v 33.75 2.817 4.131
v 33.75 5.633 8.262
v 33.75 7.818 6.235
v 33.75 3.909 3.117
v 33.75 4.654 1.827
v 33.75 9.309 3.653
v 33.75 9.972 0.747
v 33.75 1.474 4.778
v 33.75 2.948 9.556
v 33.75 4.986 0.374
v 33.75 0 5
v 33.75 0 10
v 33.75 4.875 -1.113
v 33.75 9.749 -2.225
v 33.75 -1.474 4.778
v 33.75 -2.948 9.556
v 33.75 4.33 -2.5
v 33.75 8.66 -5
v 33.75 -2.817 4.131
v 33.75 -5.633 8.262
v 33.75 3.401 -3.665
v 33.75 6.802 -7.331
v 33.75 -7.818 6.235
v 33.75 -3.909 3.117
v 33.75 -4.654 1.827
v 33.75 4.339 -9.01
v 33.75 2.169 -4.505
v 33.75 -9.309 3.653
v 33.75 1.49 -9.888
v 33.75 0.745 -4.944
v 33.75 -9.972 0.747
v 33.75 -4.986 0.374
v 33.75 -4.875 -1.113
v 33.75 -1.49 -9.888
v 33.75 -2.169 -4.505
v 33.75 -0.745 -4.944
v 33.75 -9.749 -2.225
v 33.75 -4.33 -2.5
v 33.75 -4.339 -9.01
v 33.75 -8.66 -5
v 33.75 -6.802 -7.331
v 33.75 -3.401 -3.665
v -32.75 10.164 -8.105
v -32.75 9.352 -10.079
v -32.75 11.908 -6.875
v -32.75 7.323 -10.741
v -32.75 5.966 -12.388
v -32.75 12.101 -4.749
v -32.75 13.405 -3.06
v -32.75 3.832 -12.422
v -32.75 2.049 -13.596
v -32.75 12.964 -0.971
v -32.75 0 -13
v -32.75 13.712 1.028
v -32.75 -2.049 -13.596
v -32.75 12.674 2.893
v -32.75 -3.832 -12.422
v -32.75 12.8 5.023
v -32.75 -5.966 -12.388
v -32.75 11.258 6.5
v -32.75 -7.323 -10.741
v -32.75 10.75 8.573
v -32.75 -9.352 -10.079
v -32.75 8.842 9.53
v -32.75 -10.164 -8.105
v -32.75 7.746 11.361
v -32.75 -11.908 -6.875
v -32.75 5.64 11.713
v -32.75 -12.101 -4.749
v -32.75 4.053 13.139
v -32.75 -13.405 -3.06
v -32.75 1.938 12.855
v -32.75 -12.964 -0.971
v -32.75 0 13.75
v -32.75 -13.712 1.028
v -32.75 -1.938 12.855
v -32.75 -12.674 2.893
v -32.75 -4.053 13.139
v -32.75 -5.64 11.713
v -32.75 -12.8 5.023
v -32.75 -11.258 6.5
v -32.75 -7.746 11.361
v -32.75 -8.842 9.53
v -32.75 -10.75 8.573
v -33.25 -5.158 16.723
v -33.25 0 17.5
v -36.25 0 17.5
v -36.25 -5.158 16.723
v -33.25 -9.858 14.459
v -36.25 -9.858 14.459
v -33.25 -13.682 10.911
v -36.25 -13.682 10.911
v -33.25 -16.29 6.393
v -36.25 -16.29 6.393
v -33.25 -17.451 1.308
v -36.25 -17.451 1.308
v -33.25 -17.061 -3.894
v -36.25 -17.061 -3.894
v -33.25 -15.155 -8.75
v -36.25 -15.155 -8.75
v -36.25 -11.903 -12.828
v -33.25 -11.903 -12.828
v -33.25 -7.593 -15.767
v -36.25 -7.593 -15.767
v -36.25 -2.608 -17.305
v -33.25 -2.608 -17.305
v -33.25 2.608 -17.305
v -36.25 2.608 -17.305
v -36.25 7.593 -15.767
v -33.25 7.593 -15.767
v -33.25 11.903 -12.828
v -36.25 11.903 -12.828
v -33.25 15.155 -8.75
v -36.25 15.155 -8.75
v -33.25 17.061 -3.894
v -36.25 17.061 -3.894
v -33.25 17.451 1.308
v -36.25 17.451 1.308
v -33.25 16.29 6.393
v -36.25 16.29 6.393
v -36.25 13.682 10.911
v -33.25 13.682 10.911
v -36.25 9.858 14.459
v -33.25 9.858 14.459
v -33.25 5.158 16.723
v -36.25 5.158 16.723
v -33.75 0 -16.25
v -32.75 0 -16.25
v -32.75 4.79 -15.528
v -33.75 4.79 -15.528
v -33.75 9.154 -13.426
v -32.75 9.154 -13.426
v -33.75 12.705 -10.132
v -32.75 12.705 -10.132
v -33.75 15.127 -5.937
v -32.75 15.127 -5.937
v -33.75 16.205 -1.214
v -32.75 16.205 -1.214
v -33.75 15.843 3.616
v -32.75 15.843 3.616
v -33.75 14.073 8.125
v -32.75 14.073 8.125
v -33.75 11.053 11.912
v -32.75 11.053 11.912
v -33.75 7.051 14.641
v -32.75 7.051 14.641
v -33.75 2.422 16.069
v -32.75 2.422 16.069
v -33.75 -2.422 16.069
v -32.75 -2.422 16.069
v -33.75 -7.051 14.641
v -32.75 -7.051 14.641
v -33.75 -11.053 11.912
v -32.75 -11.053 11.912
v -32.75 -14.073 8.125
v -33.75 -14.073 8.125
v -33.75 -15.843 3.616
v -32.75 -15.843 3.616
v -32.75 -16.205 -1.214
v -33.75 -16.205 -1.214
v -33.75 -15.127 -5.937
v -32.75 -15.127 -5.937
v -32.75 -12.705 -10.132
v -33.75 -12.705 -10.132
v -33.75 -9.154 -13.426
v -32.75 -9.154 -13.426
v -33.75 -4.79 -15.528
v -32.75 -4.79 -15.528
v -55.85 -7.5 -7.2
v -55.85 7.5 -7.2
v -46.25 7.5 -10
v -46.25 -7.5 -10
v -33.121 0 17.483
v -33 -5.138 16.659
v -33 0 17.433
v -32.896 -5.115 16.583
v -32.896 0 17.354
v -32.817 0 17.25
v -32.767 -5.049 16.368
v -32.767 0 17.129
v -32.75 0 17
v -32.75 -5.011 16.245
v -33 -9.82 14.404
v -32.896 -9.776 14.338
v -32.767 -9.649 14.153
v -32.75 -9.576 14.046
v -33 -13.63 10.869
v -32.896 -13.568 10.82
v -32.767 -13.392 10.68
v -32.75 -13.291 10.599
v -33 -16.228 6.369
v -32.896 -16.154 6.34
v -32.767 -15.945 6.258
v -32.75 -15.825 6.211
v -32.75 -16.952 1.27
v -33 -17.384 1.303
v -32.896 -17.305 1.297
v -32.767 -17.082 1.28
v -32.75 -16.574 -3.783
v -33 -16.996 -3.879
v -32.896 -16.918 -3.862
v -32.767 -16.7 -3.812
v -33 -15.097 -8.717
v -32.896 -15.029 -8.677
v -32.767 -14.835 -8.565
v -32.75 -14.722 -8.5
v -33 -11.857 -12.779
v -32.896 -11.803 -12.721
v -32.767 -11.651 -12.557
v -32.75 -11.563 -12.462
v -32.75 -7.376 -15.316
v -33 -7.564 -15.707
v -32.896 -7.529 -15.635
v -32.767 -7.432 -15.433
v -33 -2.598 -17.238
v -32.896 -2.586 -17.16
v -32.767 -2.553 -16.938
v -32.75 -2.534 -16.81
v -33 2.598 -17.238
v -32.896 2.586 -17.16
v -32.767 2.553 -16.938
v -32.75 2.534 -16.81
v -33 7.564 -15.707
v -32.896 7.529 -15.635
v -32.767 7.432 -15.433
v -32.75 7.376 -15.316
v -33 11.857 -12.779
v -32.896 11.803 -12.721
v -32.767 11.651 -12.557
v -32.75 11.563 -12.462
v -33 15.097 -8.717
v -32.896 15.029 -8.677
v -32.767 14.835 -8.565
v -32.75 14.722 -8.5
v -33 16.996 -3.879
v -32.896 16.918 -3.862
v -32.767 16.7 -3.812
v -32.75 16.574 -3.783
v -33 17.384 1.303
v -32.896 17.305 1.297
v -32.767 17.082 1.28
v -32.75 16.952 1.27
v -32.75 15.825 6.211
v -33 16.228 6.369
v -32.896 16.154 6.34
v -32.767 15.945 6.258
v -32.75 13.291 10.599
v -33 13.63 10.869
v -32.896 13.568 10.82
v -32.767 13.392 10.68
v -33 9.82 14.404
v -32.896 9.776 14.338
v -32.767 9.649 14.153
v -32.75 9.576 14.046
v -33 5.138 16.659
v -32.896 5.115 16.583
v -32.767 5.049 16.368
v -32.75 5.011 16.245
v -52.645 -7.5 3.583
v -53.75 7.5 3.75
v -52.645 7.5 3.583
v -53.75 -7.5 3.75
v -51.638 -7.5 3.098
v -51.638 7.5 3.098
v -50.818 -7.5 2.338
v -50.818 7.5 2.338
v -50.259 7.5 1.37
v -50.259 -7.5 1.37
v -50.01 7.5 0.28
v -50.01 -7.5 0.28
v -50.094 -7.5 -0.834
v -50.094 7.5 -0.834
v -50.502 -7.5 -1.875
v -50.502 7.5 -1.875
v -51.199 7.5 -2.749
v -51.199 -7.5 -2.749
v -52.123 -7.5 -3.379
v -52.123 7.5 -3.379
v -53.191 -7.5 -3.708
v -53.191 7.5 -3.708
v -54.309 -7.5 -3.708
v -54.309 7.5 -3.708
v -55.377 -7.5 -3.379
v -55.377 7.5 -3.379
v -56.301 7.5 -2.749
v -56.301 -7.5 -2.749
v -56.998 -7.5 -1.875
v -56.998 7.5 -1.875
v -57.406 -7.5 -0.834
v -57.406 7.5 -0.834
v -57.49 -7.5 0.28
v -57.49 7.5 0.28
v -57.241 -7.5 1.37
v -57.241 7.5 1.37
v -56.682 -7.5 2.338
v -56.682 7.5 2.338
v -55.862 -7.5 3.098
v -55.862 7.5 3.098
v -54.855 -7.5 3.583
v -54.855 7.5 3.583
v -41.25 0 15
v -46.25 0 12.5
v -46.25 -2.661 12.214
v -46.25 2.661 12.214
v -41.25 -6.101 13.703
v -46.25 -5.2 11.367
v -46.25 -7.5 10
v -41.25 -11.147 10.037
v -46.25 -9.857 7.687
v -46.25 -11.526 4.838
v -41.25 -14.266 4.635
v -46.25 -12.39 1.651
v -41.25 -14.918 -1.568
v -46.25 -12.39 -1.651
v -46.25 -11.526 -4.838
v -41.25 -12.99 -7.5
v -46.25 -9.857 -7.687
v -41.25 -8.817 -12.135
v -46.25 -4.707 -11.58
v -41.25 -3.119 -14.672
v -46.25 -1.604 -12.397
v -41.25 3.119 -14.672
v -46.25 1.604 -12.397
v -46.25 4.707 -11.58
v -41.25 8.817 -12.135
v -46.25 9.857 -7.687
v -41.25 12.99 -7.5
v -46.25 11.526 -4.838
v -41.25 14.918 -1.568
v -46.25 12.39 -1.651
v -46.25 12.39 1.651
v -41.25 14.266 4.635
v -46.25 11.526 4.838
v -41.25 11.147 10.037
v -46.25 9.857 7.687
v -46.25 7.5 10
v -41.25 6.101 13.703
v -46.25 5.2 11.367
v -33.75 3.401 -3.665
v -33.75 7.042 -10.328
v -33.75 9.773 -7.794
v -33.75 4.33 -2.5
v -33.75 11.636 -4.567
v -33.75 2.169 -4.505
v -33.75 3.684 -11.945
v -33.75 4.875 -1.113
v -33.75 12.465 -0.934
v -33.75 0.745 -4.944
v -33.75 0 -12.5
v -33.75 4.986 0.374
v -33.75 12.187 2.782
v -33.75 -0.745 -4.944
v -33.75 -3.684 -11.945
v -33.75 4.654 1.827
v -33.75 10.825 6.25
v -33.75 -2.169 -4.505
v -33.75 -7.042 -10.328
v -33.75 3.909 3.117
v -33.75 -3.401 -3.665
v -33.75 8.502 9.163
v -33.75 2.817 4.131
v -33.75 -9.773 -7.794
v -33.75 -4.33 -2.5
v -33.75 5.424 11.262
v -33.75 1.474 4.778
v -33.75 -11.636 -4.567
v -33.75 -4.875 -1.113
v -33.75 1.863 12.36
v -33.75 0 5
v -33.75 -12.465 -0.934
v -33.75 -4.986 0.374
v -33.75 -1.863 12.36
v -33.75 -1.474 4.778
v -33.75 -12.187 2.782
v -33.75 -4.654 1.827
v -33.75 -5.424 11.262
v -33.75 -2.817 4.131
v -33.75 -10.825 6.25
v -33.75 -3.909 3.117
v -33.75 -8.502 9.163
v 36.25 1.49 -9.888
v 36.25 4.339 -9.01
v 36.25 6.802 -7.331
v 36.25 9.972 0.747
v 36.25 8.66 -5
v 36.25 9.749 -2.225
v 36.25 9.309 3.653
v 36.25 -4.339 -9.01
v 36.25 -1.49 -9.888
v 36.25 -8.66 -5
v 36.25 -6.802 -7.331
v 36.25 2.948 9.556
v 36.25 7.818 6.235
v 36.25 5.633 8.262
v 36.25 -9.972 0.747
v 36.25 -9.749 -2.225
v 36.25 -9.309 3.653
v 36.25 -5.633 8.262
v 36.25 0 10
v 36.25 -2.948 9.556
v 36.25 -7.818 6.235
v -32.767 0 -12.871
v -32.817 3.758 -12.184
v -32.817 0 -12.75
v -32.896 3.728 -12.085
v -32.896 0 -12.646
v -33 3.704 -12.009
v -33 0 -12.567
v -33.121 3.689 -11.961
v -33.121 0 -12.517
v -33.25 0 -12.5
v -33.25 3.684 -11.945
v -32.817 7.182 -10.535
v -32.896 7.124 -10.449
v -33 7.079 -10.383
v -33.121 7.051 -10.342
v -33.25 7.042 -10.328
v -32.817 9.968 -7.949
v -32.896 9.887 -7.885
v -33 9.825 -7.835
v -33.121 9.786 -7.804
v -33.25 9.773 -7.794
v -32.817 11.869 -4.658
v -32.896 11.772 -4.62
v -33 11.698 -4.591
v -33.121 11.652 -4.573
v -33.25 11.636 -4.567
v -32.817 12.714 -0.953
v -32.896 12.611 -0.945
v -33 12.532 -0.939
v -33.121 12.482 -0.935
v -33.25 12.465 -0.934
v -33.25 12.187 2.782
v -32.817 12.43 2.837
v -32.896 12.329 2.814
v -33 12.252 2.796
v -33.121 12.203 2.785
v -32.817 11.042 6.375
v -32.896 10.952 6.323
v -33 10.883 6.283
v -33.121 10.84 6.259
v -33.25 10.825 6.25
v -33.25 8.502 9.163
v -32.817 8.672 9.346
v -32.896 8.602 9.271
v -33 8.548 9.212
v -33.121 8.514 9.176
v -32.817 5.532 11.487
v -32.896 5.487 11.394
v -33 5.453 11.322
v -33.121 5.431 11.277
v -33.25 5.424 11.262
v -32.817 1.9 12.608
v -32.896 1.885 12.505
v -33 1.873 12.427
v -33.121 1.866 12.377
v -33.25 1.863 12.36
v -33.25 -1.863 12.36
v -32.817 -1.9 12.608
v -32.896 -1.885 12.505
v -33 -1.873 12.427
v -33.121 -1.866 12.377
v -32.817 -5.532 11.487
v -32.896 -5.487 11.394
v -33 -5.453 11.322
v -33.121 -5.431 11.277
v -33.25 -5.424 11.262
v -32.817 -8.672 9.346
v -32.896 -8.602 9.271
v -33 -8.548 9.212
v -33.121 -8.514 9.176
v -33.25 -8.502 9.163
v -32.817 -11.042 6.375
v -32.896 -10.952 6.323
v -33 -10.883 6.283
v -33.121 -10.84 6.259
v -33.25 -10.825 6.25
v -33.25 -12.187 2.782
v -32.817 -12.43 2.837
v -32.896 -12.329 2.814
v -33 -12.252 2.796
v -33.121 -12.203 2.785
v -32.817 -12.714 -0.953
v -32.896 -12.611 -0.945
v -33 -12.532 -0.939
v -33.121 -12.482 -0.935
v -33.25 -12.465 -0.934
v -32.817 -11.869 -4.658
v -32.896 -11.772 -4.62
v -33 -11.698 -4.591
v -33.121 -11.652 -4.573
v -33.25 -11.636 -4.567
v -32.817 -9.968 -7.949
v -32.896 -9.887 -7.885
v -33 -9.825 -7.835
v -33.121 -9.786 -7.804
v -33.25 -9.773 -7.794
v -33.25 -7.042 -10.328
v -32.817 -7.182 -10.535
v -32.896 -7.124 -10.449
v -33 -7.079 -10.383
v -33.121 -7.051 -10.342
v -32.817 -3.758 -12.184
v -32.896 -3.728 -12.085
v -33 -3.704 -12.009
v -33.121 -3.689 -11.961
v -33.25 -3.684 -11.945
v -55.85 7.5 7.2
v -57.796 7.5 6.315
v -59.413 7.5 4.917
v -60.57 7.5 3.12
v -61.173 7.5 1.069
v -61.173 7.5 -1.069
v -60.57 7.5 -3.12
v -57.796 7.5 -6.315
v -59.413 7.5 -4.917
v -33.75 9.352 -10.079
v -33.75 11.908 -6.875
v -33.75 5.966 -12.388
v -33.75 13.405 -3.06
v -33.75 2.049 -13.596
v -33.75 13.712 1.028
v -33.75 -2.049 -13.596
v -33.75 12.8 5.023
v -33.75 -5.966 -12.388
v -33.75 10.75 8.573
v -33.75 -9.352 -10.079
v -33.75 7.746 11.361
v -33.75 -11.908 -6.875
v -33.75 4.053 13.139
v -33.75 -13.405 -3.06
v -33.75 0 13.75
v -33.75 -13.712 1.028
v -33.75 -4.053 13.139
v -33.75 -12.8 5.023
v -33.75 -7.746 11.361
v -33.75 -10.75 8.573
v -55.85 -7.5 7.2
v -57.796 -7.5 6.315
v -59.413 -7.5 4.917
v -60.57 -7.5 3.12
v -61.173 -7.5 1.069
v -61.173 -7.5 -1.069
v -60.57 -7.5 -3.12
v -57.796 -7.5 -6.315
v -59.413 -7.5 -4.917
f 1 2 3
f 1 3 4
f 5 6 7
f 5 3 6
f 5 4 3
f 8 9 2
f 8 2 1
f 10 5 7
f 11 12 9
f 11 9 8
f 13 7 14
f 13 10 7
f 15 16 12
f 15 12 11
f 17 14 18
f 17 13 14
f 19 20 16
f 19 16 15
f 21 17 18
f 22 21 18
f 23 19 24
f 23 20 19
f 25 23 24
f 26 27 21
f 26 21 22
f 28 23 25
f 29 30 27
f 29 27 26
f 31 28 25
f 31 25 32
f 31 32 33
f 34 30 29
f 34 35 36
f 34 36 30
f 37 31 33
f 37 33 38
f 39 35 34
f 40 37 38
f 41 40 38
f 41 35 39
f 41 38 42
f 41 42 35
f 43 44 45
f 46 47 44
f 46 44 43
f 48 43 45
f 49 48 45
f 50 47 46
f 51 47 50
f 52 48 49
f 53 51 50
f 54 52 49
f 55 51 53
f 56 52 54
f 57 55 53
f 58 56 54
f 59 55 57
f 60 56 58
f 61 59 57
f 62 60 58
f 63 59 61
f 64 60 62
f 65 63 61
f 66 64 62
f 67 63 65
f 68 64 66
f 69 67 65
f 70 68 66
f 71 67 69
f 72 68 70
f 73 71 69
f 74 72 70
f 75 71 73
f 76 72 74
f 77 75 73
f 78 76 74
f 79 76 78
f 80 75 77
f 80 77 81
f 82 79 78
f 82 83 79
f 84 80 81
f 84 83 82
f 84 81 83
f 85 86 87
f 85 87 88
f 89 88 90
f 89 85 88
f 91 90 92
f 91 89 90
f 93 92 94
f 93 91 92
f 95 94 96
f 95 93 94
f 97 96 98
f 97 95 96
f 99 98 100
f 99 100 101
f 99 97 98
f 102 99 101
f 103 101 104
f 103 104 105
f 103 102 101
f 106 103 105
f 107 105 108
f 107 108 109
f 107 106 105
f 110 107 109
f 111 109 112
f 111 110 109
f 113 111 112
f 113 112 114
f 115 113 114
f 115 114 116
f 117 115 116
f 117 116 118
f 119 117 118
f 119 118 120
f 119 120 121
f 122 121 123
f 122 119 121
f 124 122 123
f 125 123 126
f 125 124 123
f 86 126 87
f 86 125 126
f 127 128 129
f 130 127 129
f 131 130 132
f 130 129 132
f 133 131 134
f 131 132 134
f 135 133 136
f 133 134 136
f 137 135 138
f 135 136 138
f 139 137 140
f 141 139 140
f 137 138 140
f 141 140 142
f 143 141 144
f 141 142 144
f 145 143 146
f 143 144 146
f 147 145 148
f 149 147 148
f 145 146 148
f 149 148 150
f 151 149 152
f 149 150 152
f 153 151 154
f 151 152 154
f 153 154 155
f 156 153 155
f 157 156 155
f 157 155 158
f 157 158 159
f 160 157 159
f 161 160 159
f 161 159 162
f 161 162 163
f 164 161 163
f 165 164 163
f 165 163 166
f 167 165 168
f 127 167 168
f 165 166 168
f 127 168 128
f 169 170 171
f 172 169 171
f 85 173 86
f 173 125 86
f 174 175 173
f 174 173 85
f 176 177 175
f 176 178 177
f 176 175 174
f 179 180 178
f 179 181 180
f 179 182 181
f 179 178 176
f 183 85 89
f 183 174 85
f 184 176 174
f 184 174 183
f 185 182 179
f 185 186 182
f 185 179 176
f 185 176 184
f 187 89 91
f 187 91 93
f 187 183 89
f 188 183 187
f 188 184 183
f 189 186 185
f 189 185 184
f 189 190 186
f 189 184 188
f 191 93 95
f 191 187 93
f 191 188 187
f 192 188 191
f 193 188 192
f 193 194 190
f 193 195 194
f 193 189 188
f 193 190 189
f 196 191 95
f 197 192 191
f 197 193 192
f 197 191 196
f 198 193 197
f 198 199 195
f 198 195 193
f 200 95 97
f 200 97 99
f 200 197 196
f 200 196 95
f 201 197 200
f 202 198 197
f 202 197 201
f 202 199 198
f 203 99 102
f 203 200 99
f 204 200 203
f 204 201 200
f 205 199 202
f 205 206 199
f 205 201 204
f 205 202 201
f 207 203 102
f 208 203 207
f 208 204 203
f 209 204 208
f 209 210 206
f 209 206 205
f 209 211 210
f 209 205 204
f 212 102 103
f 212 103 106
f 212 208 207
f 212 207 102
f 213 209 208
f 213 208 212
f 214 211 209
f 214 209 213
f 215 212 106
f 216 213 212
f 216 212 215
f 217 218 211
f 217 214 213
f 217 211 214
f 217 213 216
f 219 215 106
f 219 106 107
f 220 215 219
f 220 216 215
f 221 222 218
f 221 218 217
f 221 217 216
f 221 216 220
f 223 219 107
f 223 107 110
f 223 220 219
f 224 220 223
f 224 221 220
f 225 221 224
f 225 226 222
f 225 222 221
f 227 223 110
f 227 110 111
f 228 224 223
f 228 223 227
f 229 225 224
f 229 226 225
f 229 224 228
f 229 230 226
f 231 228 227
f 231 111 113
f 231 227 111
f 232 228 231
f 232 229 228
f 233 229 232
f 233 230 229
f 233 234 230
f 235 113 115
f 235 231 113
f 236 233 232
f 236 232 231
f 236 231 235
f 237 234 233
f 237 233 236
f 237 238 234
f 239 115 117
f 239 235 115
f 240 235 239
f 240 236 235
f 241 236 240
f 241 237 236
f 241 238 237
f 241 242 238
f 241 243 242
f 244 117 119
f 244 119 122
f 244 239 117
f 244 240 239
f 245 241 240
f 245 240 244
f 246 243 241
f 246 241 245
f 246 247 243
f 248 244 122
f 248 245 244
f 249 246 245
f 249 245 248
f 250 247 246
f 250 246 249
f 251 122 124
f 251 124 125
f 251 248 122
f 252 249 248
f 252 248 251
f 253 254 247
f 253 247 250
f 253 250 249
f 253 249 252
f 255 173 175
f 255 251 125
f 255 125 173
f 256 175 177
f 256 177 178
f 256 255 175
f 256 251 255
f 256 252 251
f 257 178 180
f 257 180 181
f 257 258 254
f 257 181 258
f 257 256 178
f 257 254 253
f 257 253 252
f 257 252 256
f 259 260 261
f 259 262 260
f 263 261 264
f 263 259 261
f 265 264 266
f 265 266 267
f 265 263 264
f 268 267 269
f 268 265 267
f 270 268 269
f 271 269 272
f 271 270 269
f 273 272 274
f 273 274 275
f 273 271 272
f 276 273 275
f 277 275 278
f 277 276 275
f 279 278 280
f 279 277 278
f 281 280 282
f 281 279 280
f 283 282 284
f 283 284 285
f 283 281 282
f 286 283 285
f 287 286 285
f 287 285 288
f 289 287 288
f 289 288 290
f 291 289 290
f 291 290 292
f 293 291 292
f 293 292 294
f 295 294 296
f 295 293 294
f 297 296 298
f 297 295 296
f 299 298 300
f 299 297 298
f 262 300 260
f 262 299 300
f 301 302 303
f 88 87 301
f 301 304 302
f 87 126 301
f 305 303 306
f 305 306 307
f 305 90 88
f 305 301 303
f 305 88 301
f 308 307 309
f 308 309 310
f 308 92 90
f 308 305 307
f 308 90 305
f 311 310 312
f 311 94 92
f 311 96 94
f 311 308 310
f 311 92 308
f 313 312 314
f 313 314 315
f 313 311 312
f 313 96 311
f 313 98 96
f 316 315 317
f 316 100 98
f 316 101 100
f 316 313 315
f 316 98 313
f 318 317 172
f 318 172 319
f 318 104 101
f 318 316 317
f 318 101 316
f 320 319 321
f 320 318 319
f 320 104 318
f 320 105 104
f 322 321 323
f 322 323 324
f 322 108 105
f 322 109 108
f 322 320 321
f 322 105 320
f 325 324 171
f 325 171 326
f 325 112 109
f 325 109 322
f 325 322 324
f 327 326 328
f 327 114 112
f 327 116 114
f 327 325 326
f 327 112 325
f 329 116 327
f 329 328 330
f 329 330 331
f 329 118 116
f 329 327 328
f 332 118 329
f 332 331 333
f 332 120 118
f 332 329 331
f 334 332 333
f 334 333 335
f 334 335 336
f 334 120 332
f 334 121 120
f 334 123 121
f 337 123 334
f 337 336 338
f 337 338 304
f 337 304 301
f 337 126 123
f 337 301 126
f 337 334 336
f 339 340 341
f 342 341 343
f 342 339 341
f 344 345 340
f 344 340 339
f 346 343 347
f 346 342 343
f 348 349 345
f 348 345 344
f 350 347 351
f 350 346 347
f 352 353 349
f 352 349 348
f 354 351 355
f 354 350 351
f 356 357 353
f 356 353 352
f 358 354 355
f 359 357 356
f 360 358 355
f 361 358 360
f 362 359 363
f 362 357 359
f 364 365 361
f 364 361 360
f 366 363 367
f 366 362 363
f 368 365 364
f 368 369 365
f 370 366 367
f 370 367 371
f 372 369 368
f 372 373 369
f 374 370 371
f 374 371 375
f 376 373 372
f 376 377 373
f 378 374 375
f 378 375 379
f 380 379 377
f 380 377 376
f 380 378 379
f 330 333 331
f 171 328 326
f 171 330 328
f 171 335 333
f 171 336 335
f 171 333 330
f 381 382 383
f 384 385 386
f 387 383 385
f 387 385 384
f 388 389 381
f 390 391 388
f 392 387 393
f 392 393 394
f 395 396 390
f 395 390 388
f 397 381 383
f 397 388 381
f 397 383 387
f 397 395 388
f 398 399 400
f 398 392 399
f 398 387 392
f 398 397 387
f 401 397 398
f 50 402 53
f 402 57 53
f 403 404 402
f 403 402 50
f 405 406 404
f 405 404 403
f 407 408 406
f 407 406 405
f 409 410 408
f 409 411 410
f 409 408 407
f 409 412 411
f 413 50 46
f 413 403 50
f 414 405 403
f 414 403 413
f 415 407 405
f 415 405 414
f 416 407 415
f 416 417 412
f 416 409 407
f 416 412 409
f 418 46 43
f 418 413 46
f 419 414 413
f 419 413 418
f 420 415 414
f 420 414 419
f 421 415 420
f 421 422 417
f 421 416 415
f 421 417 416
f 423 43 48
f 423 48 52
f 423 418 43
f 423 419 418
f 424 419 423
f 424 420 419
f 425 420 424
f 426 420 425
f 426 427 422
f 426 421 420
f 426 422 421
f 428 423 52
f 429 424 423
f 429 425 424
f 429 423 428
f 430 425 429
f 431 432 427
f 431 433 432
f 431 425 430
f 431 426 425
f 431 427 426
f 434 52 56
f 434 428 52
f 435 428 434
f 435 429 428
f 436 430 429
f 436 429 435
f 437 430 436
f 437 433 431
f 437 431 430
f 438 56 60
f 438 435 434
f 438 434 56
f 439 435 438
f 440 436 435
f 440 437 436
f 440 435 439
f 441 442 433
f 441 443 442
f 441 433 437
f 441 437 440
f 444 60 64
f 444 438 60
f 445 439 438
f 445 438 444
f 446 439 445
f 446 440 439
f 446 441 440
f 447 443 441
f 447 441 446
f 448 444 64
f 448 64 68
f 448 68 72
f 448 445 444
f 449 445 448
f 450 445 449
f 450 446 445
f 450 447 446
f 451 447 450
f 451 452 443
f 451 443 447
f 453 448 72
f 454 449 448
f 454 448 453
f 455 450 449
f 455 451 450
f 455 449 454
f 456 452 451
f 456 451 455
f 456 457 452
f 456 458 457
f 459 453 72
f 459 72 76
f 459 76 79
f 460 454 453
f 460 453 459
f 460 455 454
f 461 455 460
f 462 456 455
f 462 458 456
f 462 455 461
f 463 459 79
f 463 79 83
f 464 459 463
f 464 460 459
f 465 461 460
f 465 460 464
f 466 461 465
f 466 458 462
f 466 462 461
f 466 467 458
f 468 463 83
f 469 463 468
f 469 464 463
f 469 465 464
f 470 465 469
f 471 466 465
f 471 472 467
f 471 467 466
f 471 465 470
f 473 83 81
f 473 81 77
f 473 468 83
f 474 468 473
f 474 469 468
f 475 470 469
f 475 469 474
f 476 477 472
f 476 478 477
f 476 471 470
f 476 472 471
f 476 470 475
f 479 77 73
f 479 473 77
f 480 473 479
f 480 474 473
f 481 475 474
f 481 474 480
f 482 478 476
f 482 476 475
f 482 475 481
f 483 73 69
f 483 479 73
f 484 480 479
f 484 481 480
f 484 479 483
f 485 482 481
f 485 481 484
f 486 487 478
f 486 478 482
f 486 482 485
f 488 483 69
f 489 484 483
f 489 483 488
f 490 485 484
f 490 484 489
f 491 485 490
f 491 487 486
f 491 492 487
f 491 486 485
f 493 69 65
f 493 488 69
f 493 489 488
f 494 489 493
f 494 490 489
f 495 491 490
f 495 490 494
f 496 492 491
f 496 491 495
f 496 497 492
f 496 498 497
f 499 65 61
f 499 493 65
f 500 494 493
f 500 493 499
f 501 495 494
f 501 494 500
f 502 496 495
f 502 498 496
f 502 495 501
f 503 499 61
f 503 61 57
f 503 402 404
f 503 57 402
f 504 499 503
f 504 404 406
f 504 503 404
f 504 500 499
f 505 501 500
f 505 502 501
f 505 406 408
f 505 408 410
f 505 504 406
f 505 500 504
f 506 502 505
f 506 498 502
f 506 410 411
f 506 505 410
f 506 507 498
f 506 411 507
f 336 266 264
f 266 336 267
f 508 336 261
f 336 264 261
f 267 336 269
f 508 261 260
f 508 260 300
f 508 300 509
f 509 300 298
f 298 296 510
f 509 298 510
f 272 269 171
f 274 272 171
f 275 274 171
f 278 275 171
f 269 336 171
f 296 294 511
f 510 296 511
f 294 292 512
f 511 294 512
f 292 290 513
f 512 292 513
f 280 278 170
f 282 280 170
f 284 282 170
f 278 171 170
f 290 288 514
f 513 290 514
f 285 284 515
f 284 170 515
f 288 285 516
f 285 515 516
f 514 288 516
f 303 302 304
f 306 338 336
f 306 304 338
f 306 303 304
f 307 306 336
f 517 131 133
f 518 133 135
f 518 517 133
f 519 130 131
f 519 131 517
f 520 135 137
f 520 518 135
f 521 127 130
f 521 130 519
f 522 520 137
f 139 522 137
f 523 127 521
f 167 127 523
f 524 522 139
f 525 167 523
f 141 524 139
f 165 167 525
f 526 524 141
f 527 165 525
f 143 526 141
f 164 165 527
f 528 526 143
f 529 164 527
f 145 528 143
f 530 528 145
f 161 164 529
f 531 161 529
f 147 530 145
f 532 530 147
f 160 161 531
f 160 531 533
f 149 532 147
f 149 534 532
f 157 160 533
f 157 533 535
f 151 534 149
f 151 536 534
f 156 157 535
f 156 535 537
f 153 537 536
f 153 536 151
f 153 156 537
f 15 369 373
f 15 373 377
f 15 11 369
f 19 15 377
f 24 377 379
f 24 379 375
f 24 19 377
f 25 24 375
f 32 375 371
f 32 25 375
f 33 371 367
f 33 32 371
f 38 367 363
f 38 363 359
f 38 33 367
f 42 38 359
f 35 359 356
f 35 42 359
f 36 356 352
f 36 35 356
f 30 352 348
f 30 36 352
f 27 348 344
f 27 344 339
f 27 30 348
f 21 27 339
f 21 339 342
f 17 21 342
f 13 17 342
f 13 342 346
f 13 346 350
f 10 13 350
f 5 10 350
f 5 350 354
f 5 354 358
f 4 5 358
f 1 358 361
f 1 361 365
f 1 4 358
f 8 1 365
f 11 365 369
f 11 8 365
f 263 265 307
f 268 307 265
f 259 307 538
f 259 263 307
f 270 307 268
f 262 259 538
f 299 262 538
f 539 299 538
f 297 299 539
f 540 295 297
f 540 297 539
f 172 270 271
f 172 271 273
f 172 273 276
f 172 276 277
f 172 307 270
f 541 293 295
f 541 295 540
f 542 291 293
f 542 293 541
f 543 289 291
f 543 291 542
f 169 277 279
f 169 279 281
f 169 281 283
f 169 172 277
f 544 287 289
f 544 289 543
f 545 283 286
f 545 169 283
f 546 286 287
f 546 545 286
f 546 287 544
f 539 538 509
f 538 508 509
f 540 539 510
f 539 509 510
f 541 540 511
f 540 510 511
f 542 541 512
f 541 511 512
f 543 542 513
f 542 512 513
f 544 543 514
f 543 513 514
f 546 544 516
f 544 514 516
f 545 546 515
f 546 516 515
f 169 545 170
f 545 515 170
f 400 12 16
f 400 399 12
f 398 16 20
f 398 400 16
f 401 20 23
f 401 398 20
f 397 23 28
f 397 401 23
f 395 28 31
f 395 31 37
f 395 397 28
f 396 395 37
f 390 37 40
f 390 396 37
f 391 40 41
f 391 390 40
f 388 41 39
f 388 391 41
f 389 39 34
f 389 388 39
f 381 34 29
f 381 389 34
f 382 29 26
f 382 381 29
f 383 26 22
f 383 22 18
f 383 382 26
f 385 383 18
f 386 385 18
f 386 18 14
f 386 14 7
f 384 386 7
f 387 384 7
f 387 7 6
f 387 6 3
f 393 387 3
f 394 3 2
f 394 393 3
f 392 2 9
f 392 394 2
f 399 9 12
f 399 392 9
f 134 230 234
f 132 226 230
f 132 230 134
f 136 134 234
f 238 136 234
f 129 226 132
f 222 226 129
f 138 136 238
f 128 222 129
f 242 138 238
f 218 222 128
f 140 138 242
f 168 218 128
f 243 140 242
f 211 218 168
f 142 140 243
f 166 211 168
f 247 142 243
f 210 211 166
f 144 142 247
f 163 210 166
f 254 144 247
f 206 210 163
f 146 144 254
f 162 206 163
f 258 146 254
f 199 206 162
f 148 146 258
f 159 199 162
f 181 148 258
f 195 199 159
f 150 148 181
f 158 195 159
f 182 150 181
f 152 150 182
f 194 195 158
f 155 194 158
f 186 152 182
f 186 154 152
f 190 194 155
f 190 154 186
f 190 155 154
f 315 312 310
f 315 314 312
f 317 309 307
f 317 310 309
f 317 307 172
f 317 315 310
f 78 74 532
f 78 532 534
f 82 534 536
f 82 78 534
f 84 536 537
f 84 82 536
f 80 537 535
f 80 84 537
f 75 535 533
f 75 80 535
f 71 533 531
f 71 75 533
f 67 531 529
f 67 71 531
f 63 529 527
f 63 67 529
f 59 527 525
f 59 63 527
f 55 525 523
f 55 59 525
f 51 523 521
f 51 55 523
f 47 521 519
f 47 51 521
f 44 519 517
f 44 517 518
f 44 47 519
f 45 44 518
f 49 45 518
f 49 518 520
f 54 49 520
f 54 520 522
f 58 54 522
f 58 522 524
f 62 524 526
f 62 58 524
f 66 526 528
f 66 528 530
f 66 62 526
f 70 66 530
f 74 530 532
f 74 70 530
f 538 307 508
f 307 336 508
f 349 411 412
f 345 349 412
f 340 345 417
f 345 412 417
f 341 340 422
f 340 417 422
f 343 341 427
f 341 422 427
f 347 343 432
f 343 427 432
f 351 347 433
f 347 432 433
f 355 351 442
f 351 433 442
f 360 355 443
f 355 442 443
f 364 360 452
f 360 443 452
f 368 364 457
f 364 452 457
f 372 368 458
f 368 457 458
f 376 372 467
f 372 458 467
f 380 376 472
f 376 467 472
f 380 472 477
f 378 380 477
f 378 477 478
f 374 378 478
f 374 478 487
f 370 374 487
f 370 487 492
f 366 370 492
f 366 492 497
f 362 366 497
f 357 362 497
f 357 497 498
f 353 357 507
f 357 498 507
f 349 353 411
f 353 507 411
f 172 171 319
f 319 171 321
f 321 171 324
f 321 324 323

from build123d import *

# Parameters (mm, degrees)
BOSS_EXTRUDE1_START = 1
SKETCH2_R           = 17.5
SKETCH2_R_2         = 16.25
SKETCH2_R_3         = 13.75
SKETCH2_R_4         = 12.5
BOSS_EXTRUDE1_DEPTH = 1
FILLET1_R           = 0.5
SKETCH3_R           = 3.75
BOSS_EXTRUDE2_DEPTH = 7.5


with BuildPart() as part:
    # Sketch1 → Revolve1 (revolve)
    with BuildSketch(Plane(origin=(0, 0, 0), x_dir=(1, 0, 0), z_dir=(0, 1, 0)), mode=Mode.PRIVATE) as revolve1_sk:
        Polygon((-36.25, 17.5), (-33.75, 17.5), (-33.75, 5), (33.75, 5), (33.75, 10), (36.25, 10), (36.25, 0), (-36.25, 0), (-46.25, 0), (-46.25, 12.5), align=None)
    revolve(revolve1_sk.sketch.rotate(Axis((-36.25, 0, 0), (1, 0, 0)), 180), axis=Axis((-36.25, 0, 0), (1, 0, 0)))

    # Sketch2 → Boss-Extrude1 (add)
    # profile 1 of 2: a face of its own
    with BuildSketch(Plane(origin=(-33.75, 0, 0), x_dir=(0, 0, -1), z_dir=(1, 0, 0)).offset(BOSS_EXTRUDE1_START)):
        with Locations(Location((0, 0, 0), (0, 0, 180))):
            Circle(SKETCH2_R)
        Circle(SKETCH2_R_2, mode=Mode.SUBTRACT)
    # profile 2 of 2: a face of its own
    with BuildSketch(Plane(origin=(-33.75, 0, 0), x_dir=(0, 0, -1), z_dir=(1, 0, 0)).offset(BOSS_EXTRUDE1_START)):
        with Locations(Location((0, 0, 0), (0, 0, 180))):
            Circle(SKETCH2_R_3)
        Circle(SKETCH2_R_4, mode=Mode.SUBTRACT)
    extrude(amount=-BOSS_EXTRUDE1_DEPTH)

    # Fillet1
    fillet1_edges = [part.edges().sort_by_distance(p)[0] for p in [
        (-32.75, 0, -17.5),
        (-32.75, 0, 12.5),
    ]]
    fillet(fillet1_edges, radius=FILLET1_R)

    # Sketch3 → Boss-Extrude2 (add, symmetric)
    with BuildSketch(Plane(origin=(0, 0, 0), x_dir=(1, 0, 0), z_dir=(0, 1, 0))):
        with BuildLine():
            Line((-46.25, 10), (-46.25, -10))
            Line((-46.25, -10), (-55.85, -7.2))
            ThreePointArc((-55.85, -7.2), (-61.25, 0), (-55.85, 7.2))
            Line((-55.85, 7.2), (-46.25, 10))
        make_face()
        with Locations(Location((-53.75, 0, 0), (0, 0, 270))):
            Circle(SKETCH3_R, mode=Mode.SUBTRACT)
    extrude(amount=BOSS_EXTRUDE2_DEPTH, both=True)


solid = part.part
